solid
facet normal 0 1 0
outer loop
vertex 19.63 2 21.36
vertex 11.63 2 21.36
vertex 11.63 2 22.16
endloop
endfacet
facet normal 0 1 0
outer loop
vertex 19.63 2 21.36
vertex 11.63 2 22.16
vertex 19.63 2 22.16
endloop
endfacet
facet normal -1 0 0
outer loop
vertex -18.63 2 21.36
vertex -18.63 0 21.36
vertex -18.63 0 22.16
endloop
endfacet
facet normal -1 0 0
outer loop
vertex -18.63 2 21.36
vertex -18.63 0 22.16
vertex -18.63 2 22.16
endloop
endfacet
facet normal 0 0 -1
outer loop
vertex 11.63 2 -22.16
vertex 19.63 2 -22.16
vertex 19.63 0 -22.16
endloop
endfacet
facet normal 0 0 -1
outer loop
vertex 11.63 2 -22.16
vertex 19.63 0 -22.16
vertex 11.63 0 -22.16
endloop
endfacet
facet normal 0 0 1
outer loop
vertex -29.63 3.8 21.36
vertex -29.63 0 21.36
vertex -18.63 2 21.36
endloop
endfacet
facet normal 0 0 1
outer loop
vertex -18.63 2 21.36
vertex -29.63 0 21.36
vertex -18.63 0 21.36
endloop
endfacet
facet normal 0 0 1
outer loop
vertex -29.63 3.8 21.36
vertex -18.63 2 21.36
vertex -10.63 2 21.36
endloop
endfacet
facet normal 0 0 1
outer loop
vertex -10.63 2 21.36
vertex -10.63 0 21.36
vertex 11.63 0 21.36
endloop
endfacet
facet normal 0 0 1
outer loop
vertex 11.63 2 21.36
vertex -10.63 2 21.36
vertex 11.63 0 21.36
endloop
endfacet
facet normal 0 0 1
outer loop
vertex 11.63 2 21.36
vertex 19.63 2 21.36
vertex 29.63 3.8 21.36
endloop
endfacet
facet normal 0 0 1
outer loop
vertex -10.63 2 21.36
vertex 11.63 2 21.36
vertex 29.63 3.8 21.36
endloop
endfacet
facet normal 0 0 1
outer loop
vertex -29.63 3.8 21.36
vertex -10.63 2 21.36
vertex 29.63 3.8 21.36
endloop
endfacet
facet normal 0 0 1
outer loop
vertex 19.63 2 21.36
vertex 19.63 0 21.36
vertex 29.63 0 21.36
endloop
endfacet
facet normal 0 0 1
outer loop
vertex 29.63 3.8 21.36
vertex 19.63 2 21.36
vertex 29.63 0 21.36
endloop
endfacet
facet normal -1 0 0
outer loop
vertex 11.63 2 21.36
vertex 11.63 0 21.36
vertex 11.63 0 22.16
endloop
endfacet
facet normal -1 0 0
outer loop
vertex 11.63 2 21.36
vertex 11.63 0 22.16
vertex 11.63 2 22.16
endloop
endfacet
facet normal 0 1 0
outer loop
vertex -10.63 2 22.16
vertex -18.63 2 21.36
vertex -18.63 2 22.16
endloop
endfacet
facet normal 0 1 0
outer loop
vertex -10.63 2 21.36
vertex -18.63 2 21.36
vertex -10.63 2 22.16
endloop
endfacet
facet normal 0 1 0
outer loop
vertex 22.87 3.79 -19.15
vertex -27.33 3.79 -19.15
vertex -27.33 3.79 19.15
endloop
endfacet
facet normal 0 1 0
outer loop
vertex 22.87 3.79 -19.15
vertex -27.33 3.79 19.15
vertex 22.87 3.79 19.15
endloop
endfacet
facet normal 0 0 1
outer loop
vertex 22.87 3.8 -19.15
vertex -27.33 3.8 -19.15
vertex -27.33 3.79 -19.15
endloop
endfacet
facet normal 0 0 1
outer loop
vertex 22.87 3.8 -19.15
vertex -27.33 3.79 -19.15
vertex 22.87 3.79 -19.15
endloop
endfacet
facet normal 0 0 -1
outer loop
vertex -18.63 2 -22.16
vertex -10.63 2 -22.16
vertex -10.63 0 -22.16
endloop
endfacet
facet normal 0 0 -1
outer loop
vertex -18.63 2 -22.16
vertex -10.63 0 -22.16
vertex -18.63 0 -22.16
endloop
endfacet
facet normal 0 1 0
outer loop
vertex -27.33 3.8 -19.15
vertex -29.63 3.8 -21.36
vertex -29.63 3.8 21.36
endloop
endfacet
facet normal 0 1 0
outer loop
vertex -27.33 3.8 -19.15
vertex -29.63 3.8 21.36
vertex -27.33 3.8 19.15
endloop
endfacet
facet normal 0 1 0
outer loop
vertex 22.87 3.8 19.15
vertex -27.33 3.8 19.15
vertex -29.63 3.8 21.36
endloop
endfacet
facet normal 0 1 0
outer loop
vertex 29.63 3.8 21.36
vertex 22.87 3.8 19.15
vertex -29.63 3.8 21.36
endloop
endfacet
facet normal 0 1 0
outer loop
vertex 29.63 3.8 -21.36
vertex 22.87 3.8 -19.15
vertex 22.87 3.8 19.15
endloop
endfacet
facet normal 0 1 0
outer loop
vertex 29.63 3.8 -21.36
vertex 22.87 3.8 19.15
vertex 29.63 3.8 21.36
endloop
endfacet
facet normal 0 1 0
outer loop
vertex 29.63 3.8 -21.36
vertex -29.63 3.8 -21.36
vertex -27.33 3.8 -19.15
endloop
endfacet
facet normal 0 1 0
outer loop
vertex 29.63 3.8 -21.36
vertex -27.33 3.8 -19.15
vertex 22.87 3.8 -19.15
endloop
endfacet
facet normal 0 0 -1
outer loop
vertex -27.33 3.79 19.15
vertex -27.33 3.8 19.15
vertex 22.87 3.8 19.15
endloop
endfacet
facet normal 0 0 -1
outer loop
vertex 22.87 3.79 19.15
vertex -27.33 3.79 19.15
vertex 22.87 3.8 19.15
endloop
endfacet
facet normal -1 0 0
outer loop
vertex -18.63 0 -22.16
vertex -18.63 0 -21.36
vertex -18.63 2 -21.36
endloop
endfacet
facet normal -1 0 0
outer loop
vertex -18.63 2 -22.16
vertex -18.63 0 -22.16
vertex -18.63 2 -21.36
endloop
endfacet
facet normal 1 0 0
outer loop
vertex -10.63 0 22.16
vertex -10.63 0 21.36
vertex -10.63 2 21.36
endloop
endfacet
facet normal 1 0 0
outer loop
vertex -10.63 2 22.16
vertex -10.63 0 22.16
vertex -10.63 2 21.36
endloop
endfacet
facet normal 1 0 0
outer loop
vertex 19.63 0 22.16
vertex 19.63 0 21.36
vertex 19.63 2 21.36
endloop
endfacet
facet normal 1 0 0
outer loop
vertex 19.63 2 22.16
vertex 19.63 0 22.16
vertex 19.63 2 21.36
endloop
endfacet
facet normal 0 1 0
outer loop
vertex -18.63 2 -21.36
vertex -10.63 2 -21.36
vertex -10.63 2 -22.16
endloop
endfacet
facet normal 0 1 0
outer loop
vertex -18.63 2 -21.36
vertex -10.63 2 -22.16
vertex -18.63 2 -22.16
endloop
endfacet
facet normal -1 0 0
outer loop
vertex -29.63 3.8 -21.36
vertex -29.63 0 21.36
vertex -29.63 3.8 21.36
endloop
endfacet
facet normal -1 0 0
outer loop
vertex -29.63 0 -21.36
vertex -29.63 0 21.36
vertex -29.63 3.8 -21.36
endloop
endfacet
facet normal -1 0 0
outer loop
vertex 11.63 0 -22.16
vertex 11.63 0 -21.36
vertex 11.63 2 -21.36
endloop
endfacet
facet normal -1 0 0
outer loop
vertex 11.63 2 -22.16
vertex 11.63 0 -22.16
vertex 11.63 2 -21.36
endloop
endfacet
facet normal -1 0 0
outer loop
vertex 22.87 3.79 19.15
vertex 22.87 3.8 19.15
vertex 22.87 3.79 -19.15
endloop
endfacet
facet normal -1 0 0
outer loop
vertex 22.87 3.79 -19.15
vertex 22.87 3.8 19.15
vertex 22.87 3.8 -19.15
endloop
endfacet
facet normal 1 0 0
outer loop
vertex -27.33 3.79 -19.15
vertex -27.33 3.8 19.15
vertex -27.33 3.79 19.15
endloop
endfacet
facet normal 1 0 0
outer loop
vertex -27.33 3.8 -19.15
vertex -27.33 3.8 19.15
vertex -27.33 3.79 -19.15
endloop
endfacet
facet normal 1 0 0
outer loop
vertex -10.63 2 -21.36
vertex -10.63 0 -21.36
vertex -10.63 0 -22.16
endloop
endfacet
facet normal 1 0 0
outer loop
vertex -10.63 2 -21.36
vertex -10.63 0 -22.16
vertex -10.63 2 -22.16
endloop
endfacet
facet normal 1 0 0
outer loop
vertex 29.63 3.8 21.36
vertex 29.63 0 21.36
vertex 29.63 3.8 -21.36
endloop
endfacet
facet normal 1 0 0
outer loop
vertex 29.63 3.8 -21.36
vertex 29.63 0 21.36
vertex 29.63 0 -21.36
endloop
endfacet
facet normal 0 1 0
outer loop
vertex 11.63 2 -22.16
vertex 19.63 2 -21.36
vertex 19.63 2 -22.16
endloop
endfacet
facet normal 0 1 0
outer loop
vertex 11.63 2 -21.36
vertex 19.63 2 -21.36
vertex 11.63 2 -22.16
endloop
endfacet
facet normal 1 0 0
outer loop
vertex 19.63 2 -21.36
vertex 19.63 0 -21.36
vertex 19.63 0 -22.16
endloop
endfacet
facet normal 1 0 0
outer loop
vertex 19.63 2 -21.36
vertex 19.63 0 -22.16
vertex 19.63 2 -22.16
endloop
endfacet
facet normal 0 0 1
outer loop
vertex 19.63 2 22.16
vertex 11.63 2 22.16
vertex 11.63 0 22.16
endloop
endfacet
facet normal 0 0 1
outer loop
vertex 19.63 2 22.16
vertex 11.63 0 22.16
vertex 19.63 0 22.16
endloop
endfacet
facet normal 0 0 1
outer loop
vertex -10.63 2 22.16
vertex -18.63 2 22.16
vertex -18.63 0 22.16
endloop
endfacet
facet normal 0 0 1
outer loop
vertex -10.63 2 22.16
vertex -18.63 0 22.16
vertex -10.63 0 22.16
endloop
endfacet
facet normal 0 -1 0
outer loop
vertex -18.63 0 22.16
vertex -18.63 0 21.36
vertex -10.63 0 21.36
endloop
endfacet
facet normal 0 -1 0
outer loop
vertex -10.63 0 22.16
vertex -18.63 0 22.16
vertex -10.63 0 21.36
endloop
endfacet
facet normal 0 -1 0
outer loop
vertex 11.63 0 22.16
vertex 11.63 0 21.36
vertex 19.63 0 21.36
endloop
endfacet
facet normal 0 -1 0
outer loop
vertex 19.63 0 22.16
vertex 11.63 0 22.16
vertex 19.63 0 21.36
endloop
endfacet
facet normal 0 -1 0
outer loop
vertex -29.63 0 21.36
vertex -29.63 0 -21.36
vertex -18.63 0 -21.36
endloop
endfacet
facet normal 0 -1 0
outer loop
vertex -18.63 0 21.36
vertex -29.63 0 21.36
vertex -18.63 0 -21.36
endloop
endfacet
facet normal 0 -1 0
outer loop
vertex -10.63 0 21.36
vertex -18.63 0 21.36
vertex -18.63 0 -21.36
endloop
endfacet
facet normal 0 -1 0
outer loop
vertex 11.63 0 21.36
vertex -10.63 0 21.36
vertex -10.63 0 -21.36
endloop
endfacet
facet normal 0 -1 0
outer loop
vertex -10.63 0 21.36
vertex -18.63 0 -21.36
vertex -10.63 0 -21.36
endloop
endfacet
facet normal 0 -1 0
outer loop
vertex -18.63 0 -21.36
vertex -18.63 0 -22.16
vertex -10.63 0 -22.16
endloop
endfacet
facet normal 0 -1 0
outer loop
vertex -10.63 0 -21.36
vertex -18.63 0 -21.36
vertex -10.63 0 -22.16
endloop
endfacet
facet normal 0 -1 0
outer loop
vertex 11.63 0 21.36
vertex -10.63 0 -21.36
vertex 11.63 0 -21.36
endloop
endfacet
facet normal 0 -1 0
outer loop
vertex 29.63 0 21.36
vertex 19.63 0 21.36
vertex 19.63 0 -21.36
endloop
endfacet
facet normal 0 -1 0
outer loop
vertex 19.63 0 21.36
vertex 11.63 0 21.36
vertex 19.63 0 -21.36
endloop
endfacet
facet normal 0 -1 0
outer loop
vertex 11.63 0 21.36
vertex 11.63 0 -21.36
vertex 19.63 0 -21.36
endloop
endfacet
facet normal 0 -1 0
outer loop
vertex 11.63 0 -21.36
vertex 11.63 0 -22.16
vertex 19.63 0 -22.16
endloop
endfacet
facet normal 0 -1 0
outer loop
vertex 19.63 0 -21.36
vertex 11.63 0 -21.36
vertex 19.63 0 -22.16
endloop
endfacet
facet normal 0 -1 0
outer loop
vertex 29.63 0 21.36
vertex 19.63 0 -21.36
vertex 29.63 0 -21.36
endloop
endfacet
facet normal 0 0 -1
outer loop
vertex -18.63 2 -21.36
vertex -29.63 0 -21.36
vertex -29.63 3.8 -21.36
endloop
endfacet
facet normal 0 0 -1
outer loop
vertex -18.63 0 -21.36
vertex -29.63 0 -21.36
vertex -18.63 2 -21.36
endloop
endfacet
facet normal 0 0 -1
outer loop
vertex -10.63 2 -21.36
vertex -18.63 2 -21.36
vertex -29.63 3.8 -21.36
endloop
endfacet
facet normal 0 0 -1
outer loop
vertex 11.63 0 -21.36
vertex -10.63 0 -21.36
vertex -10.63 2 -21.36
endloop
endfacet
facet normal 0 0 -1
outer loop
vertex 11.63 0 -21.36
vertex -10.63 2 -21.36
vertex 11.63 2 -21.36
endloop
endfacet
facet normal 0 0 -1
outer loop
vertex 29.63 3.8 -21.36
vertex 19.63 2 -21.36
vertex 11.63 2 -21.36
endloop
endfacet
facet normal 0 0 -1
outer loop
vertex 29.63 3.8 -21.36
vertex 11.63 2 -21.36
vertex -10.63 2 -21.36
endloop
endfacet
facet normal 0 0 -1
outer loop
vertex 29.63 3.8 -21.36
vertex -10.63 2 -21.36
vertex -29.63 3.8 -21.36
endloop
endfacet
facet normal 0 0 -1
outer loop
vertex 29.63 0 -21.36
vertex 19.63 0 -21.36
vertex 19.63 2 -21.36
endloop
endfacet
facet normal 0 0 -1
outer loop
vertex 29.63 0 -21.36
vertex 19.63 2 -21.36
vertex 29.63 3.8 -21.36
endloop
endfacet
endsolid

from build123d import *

# Parameters (mm, degrees)
SKETCH1_W           = 59.26
SKETCH1_H           = 42.72
BOSS_EXTRUDE1_DEPTH = 3.8
SKETCH2_W           = 8
SKETCH2_H           = 2
BOSS_EXTRUDE2_DEPTH = 0.8
SKETCH3_W           = 8
SKETCH3_H           = 2
BOSS_EXTRUDE3_DEPTH = 0.8
SKETCH4_W           = 50.2
SKETCH4_H           = 38.3
CUT_EXTRUDE1_DEPTH  = 0.01


with BuildPart() as part:
    # Sketch1 → Boss-Extrude1 (new body)
    with BuildSketch(Plane(origin=(0, 0, 0), x_dir=(1, 0, 0), z_dir=(0, 1, 0))):
        Rectangle(SKETCH1_W, SKETCH1_H)
    extrude(amount=BOSS_EXTRUDE1_DEPTH)

    # Sketch2 → Boss-Extrude2 (add)
    with BuildSketch(Plane.XY.offset(21.36)):
        with Locations((-14.63, 1)):
            Rectangle(SKETCH2_W, SKETCH2_H)
        with Locations((15.63, 1)):
            Rectangle(SKETCH2_W, SKETCH2_H)
    extrude(amount=BOSS_EXTRUDE2_DEPTH)

    # Sketch3 → Boss-Extrude3 (add)
    with BuildSketch(Plane(origin=(0, 0, -21.36), x_dir=(-1, 0, 0), z_dir=(0, 0, -1))):
        with Locations((14.63, 1)):
            Rectangle(SKETCH3_W, SKETCH3_H)
        with Locations((-15.63, 1)):
            Rectangle(SKETCH3_W, SKETCH3_H)
    extrude(amount=BOSS_EXTRUDE3_DEPTH)

    # Sketch4 → Cut-Extrude1 (cut)
    with BuildSketch(Plane(origin=(0, 3.8, 0), x_dir=(1, 0, 0), z_dir=(0, 1, 0))):
        with Locations((-2.23, 0)):
            Rectangle(SKETCH4_W, SKETCH4_H)
    extrude(amount=-CUT_EXTRUDE1_DEPTH, mode=Mode.SUBTRACT)


solid = part.part
